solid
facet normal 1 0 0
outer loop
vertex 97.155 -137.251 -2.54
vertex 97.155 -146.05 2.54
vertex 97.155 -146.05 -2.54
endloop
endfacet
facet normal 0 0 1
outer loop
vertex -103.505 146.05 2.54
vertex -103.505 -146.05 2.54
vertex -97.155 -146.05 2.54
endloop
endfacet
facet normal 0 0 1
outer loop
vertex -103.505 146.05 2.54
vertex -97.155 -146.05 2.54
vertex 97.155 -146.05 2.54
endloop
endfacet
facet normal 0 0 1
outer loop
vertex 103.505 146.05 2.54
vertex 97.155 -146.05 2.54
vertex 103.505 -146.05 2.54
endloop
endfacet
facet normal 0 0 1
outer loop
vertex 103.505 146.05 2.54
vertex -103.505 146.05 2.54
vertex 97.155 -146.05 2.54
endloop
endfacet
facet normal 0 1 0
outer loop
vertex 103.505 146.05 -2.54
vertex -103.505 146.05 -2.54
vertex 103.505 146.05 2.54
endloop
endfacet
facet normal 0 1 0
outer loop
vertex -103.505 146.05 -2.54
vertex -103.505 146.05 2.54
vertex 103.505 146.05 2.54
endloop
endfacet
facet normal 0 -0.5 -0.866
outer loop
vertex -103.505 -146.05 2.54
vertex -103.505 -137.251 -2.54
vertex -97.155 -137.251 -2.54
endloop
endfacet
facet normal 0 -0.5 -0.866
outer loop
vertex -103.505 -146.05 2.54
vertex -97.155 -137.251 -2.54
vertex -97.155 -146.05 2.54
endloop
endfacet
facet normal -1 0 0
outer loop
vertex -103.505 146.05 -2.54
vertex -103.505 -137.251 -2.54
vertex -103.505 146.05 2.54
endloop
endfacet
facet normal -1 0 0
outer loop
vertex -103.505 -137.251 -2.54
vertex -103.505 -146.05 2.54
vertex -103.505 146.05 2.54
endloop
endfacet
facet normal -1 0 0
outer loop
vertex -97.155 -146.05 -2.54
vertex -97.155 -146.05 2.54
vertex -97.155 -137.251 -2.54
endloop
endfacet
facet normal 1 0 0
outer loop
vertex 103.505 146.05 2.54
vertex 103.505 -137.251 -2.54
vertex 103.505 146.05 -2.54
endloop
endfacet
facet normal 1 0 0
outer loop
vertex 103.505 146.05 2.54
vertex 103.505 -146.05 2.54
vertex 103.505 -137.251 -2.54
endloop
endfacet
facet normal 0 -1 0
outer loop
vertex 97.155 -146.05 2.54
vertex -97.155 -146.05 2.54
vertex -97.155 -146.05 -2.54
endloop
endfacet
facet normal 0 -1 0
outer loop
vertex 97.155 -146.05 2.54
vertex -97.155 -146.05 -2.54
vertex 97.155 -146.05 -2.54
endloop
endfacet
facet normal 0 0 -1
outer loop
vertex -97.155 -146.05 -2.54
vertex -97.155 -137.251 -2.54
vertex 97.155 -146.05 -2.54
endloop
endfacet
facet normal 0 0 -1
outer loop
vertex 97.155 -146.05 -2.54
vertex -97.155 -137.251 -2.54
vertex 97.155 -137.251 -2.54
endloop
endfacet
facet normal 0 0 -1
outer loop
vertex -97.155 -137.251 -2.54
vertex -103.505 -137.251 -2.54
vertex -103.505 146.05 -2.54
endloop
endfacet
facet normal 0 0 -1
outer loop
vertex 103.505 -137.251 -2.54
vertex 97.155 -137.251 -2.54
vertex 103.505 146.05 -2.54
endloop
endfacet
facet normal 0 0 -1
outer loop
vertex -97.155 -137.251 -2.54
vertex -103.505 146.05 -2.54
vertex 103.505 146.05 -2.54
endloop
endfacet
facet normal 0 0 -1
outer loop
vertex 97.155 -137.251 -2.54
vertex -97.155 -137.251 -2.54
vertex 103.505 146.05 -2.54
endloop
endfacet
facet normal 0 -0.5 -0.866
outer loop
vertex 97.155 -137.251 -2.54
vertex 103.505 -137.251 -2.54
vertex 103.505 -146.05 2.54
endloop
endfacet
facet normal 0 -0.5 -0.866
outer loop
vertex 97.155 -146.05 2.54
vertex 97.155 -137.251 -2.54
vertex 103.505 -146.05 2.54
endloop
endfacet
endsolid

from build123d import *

# Parameters (mm, degrees)
SKETCH1_W           = 207.01
SKETCH1_H           = 292.1
BOSS_EXTRUDE1_DEPTH = 2.54
CUT_EXTRUDE3_DEPTH  = 6.35
CUT_EXTRUDE4_DEPTH  = 6.35


with BuildPart() as part:
    # Sketch1 → Boss-Extrude1 (new body, symmetric)
    with BuildSketch(Plane.XY):
        Rectangle(SKETCH1_W, SKETCH1_H)
    extrude(amount=BOSS_EXTRUDE1_DEPTH, both=True)

    # Sketch4 → Cut-Extrude3 (cut)
    with BuildSketch(Plane.ZY.offset(103.505)):
        Polygon((-2.54, -137.251181898), (2.54, -146.05), (-2.54, -146.05), align=None)
    extrude(amount=-CUT_EXTRUDE3_DEPTH, mode=Mode.SUBTRACT)

    # Sketch5 → Cut-Extrude4 (cut)
    with BuildSketch(Plane(origin=(103.505, 0, 0), x_dir=(0, 0, -1), z_dir=(1, 0, 0))):
        Polygon((2.54, -137.251181898), (-2.54, -146.05), (2.54, -146.05), align=None)
    extrude(amount=-CUT_EXTRUDE4_DEPTH, mode=Mode.SUBTRACT)


solid = part.part
